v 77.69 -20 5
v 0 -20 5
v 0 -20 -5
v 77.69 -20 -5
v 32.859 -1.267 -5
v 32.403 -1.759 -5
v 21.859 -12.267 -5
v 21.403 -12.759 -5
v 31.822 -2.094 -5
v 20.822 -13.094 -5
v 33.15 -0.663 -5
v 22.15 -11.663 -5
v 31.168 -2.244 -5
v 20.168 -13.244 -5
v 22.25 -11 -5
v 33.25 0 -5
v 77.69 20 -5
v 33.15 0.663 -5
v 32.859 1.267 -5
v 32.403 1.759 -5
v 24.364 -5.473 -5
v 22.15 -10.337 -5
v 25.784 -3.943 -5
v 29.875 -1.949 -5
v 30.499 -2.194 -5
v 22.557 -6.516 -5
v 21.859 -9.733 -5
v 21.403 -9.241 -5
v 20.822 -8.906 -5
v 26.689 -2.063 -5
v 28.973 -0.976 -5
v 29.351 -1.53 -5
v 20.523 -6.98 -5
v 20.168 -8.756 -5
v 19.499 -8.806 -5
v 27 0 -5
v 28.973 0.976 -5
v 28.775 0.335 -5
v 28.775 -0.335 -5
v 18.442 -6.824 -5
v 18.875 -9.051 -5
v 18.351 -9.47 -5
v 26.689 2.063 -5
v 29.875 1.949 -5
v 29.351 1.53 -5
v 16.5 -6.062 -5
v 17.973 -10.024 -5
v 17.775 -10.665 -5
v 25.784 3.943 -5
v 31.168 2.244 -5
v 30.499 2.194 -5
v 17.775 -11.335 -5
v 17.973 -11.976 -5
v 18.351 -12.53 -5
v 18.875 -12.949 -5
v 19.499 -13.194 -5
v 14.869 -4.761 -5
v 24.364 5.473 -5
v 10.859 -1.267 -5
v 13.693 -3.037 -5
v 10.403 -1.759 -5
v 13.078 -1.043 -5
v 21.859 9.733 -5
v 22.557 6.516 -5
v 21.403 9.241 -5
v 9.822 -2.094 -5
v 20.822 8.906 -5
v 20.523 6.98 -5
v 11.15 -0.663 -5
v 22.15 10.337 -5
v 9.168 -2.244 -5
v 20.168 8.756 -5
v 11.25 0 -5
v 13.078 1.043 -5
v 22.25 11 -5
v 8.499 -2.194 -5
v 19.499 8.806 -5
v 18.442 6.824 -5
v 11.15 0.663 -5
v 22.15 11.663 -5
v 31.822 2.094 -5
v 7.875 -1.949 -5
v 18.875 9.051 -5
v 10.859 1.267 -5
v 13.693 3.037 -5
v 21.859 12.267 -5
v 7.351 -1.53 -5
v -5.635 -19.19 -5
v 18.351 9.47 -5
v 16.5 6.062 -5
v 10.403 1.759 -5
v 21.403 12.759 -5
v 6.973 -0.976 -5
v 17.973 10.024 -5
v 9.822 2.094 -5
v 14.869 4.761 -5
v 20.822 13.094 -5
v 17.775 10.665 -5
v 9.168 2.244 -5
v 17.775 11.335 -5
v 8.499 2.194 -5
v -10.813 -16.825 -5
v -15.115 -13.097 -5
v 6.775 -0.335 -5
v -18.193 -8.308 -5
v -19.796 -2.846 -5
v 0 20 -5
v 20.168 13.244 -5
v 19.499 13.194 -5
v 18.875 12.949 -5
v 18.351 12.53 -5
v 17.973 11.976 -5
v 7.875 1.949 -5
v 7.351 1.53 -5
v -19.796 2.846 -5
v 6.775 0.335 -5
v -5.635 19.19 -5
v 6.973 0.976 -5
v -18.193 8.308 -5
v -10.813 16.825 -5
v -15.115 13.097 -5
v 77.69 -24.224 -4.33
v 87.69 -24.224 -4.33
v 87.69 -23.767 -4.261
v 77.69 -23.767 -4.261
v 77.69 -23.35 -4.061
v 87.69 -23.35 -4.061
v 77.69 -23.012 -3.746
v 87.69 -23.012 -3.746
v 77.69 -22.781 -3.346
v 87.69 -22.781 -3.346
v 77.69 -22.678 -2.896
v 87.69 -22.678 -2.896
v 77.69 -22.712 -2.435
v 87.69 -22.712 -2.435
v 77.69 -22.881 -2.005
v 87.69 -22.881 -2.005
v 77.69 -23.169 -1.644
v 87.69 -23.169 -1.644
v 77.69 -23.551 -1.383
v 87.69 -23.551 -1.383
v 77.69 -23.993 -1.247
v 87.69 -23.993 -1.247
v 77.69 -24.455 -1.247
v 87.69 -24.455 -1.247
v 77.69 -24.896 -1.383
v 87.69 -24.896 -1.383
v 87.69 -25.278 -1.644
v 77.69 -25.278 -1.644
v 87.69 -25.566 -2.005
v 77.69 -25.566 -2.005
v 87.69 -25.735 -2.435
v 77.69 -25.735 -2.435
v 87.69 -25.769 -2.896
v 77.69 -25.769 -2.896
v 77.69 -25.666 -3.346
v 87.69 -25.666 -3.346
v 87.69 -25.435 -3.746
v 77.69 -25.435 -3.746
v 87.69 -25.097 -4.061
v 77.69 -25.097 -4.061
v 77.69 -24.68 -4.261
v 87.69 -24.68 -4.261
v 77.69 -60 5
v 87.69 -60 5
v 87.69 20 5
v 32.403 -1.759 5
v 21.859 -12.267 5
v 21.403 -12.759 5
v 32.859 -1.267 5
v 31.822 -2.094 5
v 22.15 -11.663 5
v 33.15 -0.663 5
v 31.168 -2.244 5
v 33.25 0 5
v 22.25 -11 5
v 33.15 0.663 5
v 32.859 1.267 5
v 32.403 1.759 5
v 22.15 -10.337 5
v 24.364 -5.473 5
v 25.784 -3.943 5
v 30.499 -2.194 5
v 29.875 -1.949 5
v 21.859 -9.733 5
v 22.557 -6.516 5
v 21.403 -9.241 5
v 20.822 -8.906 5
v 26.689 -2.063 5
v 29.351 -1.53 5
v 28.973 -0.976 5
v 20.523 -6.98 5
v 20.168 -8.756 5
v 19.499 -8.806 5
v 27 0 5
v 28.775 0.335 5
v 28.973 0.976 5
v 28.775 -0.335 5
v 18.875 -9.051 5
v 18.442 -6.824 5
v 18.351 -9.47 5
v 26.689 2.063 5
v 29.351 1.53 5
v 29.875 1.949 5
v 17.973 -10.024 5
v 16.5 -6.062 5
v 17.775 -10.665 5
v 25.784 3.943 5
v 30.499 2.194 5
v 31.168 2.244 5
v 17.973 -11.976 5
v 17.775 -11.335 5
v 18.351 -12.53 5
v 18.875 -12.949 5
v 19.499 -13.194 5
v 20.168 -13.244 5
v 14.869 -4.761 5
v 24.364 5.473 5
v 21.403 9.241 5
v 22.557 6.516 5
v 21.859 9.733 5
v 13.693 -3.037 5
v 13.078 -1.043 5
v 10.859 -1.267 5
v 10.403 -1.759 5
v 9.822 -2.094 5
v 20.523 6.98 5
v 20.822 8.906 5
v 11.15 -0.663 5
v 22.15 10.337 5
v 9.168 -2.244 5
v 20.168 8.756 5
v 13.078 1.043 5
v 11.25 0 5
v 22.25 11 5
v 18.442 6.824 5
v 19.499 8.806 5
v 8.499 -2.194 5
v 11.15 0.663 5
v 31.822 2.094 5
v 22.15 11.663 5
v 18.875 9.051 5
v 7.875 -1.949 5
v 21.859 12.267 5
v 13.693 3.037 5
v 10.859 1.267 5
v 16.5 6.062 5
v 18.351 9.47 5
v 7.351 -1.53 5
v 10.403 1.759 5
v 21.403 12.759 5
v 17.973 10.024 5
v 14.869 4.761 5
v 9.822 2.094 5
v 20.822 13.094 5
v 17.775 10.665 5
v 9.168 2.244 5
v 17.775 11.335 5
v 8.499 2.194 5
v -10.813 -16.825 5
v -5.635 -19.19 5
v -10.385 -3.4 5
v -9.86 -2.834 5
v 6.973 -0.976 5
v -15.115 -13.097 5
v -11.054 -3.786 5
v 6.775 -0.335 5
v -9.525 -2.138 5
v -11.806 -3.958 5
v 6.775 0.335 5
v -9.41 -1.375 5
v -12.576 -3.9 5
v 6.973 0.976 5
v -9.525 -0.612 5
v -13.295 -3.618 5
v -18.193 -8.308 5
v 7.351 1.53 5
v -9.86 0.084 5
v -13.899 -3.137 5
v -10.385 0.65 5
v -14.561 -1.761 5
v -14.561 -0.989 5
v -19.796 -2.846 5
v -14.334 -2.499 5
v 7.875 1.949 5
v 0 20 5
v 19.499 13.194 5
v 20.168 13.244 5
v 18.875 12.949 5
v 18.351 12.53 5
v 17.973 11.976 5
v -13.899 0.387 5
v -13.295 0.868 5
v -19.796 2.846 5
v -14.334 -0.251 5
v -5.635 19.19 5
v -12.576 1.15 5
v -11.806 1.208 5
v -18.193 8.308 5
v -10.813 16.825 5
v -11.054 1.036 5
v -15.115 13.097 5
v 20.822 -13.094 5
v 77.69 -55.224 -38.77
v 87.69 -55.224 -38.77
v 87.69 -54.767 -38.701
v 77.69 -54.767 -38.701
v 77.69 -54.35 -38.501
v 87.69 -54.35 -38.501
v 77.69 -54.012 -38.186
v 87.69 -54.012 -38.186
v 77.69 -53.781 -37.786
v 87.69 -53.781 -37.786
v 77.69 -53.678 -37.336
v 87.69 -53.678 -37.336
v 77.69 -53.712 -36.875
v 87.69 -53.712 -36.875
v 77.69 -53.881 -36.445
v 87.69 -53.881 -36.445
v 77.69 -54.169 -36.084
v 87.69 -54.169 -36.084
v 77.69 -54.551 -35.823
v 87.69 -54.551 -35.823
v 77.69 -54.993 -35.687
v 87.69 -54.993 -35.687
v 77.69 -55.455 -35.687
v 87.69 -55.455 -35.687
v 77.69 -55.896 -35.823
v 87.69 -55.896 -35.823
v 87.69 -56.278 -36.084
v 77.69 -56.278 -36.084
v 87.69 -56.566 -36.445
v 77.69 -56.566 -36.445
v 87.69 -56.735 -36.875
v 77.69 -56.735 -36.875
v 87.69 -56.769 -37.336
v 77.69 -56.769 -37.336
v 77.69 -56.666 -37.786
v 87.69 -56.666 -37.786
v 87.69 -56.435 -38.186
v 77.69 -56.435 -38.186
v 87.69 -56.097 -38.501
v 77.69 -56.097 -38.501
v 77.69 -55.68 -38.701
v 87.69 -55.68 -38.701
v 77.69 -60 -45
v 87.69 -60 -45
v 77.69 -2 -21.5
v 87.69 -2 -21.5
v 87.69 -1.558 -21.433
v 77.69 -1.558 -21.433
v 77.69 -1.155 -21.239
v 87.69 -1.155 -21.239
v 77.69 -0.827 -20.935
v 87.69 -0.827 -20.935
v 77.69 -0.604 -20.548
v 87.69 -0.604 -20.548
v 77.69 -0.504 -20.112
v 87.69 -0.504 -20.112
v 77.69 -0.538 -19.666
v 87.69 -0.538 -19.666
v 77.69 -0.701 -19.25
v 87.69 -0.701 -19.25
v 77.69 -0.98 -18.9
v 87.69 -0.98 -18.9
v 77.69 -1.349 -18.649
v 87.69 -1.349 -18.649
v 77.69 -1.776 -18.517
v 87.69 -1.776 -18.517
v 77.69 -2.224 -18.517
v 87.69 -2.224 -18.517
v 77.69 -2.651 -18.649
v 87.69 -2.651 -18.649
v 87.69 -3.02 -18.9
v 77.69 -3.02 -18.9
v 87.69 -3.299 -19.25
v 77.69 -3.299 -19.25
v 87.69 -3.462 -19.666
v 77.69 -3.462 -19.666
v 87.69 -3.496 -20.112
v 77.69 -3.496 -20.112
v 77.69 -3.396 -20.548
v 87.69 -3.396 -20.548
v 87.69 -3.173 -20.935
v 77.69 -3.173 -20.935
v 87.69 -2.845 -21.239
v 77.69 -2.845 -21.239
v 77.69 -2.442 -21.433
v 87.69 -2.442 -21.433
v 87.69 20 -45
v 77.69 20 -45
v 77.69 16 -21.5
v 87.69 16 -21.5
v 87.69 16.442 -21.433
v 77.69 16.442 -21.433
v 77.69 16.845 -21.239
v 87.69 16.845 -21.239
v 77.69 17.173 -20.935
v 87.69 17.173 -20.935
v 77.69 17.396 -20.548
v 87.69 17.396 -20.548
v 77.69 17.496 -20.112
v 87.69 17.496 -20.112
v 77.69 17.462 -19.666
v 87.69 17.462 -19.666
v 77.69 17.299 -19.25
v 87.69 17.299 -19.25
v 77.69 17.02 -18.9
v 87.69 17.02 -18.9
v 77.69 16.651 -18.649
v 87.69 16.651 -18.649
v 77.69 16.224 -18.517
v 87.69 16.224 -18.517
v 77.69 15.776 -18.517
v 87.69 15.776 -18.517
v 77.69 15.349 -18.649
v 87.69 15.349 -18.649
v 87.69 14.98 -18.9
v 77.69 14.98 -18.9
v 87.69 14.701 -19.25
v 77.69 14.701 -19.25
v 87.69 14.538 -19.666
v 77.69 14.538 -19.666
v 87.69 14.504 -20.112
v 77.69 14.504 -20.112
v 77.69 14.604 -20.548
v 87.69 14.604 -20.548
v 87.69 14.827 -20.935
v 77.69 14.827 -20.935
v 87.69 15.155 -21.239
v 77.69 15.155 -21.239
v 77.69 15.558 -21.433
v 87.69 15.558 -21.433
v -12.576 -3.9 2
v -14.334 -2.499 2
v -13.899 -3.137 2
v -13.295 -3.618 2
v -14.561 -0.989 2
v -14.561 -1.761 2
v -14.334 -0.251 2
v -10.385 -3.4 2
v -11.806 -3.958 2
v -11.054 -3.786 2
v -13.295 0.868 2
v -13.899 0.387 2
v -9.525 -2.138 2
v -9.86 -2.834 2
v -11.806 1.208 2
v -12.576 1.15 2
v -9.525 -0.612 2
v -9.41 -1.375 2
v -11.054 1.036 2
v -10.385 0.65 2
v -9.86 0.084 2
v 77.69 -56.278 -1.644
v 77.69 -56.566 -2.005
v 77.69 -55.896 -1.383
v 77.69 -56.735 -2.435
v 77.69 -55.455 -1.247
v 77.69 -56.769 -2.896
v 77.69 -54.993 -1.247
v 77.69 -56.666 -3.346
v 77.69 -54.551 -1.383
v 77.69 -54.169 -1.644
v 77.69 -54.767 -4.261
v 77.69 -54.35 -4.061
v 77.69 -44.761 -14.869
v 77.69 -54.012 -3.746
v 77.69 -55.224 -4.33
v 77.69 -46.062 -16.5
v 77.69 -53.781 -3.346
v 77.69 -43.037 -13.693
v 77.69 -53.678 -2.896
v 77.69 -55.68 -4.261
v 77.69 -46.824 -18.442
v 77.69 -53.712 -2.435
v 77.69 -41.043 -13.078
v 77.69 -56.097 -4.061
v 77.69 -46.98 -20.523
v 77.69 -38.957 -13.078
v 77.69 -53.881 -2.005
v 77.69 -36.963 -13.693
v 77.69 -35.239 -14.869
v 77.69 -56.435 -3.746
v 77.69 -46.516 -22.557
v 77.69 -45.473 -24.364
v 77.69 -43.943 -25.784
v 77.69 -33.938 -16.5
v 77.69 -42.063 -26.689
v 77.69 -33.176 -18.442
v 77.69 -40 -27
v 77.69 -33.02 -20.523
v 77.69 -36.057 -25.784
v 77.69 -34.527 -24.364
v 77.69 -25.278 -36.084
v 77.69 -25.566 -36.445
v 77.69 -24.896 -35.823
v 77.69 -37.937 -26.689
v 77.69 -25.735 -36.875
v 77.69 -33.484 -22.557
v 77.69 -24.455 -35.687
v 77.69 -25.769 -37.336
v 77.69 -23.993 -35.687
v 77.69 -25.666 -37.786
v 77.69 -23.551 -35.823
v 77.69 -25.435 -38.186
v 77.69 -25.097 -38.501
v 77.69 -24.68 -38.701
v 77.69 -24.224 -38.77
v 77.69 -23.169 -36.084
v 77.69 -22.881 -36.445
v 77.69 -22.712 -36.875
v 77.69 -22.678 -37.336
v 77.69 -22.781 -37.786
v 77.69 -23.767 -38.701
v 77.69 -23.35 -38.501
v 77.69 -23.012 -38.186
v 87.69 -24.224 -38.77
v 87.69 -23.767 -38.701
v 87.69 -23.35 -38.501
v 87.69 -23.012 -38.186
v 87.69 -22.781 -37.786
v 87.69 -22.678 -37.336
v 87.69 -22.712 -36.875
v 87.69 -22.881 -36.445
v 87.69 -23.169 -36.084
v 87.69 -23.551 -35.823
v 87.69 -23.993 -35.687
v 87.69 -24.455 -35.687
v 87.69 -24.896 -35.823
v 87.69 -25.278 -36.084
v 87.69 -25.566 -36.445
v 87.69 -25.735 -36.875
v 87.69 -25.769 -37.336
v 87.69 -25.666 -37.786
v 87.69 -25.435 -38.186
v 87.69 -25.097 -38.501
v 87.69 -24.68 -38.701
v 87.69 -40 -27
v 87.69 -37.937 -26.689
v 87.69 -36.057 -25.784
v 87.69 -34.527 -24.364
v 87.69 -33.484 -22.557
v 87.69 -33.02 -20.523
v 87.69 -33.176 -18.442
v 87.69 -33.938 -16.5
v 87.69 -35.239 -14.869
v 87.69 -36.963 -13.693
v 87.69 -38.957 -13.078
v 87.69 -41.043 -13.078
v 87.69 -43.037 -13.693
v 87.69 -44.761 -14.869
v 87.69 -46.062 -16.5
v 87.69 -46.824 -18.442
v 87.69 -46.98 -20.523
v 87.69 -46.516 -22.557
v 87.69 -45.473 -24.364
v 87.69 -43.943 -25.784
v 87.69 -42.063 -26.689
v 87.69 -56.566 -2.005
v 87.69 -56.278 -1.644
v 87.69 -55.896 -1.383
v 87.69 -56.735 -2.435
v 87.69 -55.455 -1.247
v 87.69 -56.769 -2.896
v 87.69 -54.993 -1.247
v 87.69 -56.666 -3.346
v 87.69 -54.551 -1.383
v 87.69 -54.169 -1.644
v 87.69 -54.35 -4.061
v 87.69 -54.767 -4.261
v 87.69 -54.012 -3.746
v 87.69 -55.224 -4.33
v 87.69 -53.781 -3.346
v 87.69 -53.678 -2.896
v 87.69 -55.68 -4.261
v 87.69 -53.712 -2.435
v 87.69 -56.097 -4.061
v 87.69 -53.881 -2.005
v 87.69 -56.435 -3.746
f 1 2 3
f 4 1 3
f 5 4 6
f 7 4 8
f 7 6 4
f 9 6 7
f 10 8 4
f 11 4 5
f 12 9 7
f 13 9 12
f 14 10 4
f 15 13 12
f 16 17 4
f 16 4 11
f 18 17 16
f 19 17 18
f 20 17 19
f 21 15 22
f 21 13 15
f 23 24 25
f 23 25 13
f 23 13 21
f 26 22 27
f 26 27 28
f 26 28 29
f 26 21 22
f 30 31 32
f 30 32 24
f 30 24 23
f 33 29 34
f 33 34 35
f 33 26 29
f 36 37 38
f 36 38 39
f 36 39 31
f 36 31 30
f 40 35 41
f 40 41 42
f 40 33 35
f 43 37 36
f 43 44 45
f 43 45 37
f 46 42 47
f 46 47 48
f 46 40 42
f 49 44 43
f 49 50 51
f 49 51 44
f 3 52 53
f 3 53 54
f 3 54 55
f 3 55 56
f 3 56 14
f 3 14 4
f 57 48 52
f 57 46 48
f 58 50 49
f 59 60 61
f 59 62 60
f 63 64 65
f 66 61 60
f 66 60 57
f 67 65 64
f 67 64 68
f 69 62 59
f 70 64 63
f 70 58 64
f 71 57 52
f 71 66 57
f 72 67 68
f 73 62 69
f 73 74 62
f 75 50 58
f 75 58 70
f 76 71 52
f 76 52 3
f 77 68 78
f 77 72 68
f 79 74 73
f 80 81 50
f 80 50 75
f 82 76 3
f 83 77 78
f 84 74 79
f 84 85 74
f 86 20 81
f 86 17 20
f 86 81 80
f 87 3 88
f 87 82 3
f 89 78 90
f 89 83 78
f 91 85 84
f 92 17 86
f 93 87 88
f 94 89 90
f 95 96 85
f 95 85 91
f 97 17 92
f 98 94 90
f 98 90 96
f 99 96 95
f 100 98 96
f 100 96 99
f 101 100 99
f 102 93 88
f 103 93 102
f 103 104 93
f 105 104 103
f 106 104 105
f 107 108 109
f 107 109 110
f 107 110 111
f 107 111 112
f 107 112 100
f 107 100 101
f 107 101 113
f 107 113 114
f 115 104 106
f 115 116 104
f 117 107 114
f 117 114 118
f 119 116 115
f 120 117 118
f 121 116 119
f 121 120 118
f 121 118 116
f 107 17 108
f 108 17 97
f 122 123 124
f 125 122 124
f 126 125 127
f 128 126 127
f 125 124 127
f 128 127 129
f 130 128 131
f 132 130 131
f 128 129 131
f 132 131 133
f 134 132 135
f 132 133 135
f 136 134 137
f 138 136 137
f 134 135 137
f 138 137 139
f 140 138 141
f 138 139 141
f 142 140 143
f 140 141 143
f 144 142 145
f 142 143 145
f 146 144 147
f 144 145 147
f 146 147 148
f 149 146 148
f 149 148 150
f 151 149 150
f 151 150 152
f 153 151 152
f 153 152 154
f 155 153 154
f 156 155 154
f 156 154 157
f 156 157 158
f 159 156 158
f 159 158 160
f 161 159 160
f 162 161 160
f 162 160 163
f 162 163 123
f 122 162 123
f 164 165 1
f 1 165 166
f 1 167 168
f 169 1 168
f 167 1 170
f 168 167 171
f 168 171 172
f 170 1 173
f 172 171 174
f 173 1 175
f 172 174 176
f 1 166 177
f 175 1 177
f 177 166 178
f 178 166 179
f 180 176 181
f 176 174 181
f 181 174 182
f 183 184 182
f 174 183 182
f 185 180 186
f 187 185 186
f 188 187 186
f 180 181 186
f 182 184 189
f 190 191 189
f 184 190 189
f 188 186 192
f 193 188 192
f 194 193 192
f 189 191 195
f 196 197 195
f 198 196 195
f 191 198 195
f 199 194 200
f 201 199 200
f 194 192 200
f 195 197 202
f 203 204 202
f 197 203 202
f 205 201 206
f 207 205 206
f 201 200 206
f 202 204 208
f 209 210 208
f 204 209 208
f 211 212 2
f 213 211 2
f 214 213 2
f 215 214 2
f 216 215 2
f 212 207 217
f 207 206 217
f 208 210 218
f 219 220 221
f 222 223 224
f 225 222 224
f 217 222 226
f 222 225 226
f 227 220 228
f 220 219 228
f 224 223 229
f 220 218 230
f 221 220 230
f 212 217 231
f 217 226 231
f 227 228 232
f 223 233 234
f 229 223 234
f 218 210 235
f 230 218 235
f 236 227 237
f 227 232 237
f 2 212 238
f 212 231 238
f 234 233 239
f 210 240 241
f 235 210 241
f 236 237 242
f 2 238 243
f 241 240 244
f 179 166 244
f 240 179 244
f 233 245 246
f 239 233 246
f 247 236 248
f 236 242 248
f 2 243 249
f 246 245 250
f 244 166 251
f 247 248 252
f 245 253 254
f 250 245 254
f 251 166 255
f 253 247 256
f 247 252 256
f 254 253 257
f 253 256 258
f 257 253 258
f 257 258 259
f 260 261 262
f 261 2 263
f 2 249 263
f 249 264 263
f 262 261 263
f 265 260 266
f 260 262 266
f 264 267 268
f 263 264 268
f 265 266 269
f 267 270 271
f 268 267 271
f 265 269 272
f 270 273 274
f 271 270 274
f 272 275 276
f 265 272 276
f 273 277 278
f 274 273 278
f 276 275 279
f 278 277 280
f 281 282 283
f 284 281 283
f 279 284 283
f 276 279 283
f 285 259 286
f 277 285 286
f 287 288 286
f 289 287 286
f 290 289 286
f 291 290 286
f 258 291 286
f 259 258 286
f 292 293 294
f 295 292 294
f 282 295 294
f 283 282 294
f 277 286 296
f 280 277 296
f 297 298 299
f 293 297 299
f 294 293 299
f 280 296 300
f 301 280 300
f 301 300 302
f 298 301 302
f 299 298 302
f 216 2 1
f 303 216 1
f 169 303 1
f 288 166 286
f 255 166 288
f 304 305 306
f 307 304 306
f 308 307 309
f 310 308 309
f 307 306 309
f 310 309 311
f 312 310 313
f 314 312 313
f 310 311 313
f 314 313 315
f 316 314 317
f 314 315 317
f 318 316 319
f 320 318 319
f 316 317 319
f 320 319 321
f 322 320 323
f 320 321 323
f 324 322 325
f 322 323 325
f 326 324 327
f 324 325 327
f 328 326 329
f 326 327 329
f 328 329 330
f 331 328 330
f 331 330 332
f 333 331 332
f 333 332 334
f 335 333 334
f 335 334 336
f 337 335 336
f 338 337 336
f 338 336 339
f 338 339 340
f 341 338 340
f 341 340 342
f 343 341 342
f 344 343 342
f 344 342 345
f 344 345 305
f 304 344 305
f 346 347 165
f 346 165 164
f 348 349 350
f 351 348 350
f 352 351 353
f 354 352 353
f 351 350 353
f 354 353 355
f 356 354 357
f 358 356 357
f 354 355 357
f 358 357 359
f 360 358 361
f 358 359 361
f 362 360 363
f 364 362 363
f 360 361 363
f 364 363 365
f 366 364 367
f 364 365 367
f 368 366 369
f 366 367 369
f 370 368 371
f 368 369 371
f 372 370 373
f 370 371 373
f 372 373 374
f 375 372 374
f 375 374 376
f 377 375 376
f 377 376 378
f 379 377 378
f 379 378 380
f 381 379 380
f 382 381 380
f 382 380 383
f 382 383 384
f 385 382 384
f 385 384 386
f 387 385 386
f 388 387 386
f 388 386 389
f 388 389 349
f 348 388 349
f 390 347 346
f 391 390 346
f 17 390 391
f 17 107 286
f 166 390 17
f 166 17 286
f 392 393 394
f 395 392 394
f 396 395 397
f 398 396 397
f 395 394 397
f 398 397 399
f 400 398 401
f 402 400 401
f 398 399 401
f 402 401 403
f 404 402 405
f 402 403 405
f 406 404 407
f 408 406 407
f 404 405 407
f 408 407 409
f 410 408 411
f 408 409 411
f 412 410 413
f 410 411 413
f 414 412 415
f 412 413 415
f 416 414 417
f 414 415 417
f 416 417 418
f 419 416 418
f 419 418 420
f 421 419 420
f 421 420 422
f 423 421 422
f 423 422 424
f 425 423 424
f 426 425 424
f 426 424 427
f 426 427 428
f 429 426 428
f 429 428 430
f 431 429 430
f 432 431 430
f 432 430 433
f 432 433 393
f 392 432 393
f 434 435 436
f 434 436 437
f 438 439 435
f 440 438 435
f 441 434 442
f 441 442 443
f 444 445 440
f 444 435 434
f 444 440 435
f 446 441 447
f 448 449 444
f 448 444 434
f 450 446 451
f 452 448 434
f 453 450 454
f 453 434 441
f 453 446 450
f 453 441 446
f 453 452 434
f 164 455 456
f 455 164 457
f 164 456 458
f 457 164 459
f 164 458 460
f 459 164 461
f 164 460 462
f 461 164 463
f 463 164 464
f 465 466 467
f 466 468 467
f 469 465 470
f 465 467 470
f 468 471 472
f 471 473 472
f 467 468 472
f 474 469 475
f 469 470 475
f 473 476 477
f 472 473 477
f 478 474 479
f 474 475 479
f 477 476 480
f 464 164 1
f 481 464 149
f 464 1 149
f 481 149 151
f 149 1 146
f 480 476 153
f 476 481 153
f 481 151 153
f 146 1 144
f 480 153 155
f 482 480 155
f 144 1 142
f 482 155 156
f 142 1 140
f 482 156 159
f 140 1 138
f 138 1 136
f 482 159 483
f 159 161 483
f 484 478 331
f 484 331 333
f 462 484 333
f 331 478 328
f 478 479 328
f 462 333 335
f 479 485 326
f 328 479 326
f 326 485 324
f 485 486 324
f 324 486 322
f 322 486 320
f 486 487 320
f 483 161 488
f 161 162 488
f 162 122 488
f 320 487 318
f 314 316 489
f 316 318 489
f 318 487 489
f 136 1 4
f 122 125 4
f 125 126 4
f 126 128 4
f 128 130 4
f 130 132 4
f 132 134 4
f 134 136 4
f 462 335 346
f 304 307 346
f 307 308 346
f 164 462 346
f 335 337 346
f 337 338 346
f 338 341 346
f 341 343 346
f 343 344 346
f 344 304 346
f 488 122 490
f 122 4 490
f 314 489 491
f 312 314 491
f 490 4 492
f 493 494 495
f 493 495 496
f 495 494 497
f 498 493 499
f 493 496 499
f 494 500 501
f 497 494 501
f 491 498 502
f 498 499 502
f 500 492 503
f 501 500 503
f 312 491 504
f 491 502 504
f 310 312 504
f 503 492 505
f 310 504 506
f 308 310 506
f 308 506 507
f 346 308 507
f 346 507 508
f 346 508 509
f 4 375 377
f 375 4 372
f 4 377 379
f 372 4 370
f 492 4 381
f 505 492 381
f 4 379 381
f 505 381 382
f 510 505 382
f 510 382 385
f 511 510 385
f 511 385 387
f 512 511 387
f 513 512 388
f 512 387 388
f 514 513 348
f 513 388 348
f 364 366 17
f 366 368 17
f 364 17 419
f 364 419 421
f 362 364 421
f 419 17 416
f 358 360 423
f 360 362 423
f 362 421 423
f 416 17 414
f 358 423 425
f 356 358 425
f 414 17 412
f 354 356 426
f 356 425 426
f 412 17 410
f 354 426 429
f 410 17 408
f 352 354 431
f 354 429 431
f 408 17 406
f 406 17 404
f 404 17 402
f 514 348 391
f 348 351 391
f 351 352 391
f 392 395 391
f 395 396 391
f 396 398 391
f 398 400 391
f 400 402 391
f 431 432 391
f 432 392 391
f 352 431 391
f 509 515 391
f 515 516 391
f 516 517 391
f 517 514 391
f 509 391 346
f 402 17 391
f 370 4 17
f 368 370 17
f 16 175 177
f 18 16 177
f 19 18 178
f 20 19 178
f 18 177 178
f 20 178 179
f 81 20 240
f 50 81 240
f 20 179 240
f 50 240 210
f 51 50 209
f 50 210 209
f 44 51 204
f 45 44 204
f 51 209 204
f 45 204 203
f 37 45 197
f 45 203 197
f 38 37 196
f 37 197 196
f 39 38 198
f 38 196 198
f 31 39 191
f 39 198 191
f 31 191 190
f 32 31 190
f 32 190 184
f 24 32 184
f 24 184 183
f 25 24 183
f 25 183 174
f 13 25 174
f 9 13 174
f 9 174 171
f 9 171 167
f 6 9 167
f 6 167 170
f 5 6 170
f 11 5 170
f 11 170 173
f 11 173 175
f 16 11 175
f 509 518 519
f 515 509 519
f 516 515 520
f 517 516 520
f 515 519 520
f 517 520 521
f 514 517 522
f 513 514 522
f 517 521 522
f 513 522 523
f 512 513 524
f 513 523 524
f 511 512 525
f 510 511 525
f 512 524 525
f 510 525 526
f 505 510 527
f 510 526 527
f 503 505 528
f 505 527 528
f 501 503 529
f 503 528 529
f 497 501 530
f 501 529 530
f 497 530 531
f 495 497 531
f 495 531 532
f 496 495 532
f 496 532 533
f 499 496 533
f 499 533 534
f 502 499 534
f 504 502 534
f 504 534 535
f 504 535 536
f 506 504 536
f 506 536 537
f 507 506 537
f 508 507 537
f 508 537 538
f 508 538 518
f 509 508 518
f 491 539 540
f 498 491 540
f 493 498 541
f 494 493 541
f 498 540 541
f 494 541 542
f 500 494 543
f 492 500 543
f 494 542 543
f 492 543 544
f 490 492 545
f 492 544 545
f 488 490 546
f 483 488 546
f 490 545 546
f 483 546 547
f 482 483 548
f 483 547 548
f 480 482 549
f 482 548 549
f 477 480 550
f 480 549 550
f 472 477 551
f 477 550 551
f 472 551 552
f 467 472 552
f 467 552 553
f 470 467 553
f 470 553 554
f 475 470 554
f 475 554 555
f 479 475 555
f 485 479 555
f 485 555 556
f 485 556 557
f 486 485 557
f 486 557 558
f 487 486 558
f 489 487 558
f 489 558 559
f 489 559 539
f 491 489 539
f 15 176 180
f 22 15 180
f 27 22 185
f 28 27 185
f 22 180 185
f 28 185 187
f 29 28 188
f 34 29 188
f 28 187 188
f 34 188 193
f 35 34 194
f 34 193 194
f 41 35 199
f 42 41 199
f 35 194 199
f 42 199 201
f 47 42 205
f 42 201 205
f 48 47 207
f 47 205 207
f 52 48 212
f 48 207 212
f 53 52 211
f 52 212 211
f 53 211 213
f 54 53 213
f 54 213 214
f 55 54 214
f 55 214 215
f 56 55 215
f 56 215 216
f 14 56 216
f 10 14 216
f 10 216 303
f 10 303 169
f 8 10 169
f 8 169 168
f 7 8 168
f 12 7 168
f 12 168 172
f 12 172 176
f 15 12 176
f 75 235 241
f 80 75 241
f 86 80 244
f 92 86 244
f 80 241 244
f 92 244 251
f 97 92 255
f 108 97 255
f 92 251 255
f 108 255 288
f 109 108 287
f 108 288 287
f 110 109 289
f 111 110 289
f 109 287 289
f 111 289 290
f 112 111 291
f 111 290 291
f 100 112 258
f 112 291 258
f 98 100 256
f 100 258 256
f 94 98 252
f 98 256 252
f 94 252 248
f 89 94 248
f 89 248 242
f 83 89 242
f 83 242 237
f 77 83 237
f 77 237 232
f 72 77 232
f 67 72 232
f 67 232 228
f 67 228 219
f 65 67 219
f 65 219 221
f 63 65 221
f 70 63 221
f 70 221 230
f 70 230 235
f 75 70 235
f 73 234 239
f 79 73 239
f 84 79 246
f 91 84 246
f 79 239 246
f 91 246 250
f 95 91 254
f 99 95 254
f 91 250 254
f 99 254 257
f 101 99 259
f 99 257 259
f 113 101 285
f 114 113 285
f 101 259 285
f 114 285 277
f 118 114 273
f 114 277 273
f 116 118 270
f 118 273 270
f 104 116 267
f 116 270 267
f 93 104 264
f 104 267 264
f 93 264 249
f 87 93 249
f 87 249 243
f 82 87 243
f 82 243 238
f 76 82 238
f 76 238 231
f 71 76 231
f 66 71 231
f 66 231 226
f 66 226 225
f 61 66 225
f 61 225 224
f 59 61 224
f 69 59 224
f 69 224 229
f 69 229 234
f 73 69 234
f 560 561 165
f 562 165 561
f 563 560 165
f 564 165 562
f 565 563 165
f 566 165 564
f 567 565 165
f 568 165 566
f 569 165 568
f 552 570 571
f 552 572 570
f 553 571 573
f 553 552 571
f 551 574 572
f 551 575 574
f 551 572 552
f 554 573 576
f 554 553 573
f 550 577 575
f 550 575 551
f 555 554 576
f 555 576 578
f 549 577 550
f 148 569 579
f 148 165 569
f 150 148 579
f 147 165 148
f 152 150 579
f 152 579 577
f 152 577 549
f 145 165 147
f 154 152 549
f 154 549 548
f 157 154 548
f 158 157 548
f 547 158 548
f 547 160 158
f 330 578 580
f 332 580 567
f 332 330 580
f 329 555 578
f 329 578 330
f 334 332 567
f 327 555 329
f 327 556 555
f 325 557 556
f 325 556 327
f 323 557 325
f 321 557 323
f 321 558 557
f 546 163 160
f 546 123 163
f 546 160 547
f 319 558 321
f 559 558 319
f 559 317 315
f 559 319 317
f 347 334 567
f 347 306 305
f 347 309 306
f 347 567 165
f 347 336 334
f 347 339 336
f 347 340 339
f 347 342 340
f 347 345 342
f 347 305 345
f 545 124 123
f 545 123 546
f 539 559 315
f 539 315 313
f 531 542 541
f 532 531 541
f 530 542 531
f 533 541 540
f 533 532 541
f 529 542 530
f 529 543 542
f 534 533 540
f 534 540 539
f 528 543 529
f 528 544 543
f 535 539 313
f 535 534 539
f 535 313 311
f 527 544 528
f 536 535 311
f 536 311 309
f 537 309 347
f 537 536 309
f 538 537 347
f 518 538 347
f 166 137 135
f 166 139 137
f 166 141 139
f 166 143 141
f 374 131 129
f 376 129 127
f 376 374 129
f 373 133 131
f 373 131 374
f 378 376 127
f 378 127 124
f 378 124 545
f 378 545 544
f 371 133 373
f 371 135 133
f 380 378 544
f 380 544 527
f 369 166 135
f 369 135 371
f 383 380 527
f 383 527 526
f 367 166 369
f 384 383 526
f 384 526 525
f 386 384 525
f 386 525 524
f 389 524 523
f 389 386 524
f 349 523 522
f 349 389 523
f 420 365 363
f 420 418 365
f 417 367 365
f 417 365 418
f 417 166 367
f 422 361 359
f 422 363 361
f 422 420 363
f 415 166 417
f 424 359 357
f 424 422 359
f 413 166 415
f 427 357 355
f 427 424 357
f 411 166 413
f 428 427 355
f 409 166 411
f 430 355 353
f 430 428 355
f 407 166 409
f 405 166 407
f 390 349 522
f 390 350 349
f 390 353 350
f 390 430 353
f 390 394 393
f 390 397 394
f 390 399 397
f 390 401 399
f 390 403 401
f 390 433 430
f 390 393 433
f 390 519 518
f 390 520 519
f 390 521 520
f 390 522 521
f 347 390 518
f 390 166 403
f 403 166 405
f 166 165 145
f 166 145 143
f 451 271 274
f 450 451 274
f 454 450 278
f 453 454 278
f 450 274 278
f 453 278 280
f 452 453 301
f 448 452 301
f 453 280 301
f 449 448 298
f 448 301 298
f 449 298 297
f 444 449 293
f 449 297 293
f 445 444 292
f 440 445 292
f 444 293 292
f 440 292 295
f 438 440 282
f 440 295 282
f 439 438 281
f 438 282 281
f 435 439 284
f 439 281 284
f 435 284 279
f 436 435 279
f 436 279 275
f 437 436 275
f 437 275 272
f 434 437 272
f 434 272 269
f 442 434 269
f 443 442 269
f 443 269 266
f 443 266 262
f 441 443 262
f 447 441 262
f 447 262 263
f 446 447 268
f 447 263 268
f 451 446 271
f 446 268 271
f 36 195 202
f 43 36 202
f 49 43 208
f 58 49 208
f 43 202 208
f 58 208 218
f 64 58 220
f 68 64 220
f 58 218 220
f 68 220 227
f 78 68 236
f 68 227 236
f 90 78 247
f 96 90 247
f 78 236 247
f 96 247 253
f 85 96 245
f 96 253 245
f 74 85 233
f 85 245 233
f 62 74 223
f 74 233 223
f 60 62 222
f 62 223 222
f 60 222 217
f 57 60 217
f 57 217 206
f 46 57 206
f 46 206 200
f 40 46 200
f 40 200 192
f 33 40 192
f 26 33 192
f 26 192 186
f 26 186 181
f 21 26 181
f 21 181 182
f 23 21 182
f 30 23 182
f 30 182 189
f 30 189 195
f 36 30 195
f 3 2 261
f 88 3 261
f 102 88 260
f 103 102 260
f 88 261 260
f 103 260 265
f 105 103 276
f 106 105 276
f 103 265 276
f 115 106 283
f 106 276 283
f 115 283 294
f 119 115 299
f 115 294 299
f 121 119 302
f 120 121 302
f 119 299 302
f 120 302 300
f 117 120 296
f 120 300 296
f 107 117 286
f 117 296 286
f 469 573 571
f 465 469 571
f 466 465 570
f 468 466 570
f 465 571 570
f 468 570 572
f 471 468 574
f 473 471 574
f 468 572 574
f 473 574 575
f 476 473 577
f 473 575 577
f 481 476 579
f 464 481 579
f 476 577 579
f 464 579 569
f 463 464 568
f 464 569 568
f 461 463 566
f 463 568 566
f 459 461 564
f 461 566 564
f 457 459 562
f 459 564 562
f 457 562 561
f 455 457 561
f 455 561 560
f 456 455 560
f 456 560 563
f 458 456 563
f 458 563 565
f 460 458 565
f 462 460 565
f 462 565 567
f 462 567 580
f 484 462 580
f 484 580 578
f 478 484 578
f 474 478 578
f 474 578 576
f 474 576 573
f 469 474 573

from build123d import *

# Parameters (mm, degrees)
BOSS_EXTRUDE1_DEPTH = 5
SKETCH6_R           = 7
SKETCH6_R_2         = 2.25
CUT_EXTRUDE1_DEPTH  = 91.496055715
BOSS_EXTRUDE2_DEPTH = 10
SKETCH11_R          = 2.59
CUT_EXTRUDE3_DEPTH  = 3
SKETCH16_R          = 1.5
CUT_EXTRUDE6_DEPTH  = 119.415100811
SKETCH24_W          = 10
SKETCH24_H          = 50
BOSS_EXTRUDE8_DEPTH = 40
SKETCH25_R          = 7
CUT_EXTRUDE10_DEPTH = 132.23313644
SKETCH26_R          = 1.55
CUT_EXTRUDE11_DEPTH = 132.23313644


with BuildPart() as part:
    # Sketch3 → Boss-Extrude1 (new, symmetric)
    with BuildSketch(Plane.XY):
        with BuildLine():
            Line((0, 20), (87.69, 20))
            Line((87.69, 20), (87.69, -20))
            Line((87.69, -20), (0, -20))
            ThreePointArc((0, -20), (-20, 0), (0, 20))
        make_face()
    extrude(amount=BOSS_EXTRUDE1_DEPTH, both=True)

    # Sketch6 → Cut-Extrude1 (cut, through all)
    with BuildSketch(Plane.XY.offset(5)):
        with Locations((20, 0)):
            Circle(SKETCH6_R)
        with Locations((20, 11)):
            Circle(SKETCH6_R_2)
        with Locations((31, 0)):
            Circle(SKETCH6_R_2)
        with Locations((20, -11)):
            Circle(SKETCH6_R_2)
        with Locations((9, 0)):
            Circle(SKETCH6_R_2)
    extrude(amount=-CUT_EXTRUDE1_DEPTH, mode=Mode.SUBTRACT)

    # Sketch9 → Boss-Extrude2 (add)
    with BuildSketch(Plane(origin=(87.69, 0, 0), x_dir=(0, 0, -1), z_dir=(1, 0, 0))):
        Polygon((5, 20), (45, 20), (45, -20), (5, -20), (-5, -20), (-5, 20), align=None)
    extrude(amount=-BOSS_EXTRUDE2_DEPTH)

    # Sketch11 → Cut-Extrude3 (cut)
    with BuildSketch(Plane.XY.offset(5)):
        with Locations((-12, -1.375)):
            Circle(SKETCH11_R)
    extrude(amount=-CUT_EXTRUDE3_DEPTH, mode=Mode.SUBTRACT)

    # Sketch16 → Cut-Extrude6 (cut, through all)
    with BuildSketch(Plane(origin=(87.69, 0, 0), x_dir=(0, 0, -1), z_dir=(1, 0, 0))):
        with Locations((20, 16)):
            Circle(SKETCH16_R)
        with Locations((20, -2)):
            Circle(SKETCH16_R)
    extrude(amount=-CUT_EXTRUDE6_DEPTH, mode=Mode.SUBTRACT)

    # Sketch24 → Boss-Extrude8 (add)
    with BuildSketch(Plane(origin=(0, -20, 0), x_dir=(-1, 0, 0), z_dir=(0, -1, 0))):
        with Locations((-82.69, 20)):
            Rectangle(SKETCH24_W, SKETCH24_H)
    extrude(amount=BOSS_EXTRUDE8_DEPTH)

    # Sketch25 → Cut-Extrude10 (cut, through all)
    with BuildSketch(Plane(origin=(87.69, 0, 0), x_dir=(0, 0, -1), z_dir=(1, 0, 0))):
        with Locations((20, -40)):
            Circle(SKETCH25_R)
    extrude(amount=-CUT_EXTRUDE10_DEPTH, mode=Mode.SUBTRACT)

    # Sketch26 → Cut-Extrude11 (cut, through all)
    with BuildSketch(Plane(origin=(87.69, 0, 0), x_dir=(0, 0, -1), z_dir=(1, 0, 0))):
        with Locations((2.78, -24.223522787)):
            Circle(SKETCH26_R)
        with Locations((37.22, -24.223522787)):
            Circle(SKETCH26_R)
        with Locations((37.22, -55.223522787)):
            Circle(SKETCH26_R)
        with Locations((2.78, -55.223522787)):
            Circle(SKETCH26_R)
    extrude(amount=-CUT_EXTRUDE11_DEPTH, mode=Mode.SUBTRACT)


solid = part.part
